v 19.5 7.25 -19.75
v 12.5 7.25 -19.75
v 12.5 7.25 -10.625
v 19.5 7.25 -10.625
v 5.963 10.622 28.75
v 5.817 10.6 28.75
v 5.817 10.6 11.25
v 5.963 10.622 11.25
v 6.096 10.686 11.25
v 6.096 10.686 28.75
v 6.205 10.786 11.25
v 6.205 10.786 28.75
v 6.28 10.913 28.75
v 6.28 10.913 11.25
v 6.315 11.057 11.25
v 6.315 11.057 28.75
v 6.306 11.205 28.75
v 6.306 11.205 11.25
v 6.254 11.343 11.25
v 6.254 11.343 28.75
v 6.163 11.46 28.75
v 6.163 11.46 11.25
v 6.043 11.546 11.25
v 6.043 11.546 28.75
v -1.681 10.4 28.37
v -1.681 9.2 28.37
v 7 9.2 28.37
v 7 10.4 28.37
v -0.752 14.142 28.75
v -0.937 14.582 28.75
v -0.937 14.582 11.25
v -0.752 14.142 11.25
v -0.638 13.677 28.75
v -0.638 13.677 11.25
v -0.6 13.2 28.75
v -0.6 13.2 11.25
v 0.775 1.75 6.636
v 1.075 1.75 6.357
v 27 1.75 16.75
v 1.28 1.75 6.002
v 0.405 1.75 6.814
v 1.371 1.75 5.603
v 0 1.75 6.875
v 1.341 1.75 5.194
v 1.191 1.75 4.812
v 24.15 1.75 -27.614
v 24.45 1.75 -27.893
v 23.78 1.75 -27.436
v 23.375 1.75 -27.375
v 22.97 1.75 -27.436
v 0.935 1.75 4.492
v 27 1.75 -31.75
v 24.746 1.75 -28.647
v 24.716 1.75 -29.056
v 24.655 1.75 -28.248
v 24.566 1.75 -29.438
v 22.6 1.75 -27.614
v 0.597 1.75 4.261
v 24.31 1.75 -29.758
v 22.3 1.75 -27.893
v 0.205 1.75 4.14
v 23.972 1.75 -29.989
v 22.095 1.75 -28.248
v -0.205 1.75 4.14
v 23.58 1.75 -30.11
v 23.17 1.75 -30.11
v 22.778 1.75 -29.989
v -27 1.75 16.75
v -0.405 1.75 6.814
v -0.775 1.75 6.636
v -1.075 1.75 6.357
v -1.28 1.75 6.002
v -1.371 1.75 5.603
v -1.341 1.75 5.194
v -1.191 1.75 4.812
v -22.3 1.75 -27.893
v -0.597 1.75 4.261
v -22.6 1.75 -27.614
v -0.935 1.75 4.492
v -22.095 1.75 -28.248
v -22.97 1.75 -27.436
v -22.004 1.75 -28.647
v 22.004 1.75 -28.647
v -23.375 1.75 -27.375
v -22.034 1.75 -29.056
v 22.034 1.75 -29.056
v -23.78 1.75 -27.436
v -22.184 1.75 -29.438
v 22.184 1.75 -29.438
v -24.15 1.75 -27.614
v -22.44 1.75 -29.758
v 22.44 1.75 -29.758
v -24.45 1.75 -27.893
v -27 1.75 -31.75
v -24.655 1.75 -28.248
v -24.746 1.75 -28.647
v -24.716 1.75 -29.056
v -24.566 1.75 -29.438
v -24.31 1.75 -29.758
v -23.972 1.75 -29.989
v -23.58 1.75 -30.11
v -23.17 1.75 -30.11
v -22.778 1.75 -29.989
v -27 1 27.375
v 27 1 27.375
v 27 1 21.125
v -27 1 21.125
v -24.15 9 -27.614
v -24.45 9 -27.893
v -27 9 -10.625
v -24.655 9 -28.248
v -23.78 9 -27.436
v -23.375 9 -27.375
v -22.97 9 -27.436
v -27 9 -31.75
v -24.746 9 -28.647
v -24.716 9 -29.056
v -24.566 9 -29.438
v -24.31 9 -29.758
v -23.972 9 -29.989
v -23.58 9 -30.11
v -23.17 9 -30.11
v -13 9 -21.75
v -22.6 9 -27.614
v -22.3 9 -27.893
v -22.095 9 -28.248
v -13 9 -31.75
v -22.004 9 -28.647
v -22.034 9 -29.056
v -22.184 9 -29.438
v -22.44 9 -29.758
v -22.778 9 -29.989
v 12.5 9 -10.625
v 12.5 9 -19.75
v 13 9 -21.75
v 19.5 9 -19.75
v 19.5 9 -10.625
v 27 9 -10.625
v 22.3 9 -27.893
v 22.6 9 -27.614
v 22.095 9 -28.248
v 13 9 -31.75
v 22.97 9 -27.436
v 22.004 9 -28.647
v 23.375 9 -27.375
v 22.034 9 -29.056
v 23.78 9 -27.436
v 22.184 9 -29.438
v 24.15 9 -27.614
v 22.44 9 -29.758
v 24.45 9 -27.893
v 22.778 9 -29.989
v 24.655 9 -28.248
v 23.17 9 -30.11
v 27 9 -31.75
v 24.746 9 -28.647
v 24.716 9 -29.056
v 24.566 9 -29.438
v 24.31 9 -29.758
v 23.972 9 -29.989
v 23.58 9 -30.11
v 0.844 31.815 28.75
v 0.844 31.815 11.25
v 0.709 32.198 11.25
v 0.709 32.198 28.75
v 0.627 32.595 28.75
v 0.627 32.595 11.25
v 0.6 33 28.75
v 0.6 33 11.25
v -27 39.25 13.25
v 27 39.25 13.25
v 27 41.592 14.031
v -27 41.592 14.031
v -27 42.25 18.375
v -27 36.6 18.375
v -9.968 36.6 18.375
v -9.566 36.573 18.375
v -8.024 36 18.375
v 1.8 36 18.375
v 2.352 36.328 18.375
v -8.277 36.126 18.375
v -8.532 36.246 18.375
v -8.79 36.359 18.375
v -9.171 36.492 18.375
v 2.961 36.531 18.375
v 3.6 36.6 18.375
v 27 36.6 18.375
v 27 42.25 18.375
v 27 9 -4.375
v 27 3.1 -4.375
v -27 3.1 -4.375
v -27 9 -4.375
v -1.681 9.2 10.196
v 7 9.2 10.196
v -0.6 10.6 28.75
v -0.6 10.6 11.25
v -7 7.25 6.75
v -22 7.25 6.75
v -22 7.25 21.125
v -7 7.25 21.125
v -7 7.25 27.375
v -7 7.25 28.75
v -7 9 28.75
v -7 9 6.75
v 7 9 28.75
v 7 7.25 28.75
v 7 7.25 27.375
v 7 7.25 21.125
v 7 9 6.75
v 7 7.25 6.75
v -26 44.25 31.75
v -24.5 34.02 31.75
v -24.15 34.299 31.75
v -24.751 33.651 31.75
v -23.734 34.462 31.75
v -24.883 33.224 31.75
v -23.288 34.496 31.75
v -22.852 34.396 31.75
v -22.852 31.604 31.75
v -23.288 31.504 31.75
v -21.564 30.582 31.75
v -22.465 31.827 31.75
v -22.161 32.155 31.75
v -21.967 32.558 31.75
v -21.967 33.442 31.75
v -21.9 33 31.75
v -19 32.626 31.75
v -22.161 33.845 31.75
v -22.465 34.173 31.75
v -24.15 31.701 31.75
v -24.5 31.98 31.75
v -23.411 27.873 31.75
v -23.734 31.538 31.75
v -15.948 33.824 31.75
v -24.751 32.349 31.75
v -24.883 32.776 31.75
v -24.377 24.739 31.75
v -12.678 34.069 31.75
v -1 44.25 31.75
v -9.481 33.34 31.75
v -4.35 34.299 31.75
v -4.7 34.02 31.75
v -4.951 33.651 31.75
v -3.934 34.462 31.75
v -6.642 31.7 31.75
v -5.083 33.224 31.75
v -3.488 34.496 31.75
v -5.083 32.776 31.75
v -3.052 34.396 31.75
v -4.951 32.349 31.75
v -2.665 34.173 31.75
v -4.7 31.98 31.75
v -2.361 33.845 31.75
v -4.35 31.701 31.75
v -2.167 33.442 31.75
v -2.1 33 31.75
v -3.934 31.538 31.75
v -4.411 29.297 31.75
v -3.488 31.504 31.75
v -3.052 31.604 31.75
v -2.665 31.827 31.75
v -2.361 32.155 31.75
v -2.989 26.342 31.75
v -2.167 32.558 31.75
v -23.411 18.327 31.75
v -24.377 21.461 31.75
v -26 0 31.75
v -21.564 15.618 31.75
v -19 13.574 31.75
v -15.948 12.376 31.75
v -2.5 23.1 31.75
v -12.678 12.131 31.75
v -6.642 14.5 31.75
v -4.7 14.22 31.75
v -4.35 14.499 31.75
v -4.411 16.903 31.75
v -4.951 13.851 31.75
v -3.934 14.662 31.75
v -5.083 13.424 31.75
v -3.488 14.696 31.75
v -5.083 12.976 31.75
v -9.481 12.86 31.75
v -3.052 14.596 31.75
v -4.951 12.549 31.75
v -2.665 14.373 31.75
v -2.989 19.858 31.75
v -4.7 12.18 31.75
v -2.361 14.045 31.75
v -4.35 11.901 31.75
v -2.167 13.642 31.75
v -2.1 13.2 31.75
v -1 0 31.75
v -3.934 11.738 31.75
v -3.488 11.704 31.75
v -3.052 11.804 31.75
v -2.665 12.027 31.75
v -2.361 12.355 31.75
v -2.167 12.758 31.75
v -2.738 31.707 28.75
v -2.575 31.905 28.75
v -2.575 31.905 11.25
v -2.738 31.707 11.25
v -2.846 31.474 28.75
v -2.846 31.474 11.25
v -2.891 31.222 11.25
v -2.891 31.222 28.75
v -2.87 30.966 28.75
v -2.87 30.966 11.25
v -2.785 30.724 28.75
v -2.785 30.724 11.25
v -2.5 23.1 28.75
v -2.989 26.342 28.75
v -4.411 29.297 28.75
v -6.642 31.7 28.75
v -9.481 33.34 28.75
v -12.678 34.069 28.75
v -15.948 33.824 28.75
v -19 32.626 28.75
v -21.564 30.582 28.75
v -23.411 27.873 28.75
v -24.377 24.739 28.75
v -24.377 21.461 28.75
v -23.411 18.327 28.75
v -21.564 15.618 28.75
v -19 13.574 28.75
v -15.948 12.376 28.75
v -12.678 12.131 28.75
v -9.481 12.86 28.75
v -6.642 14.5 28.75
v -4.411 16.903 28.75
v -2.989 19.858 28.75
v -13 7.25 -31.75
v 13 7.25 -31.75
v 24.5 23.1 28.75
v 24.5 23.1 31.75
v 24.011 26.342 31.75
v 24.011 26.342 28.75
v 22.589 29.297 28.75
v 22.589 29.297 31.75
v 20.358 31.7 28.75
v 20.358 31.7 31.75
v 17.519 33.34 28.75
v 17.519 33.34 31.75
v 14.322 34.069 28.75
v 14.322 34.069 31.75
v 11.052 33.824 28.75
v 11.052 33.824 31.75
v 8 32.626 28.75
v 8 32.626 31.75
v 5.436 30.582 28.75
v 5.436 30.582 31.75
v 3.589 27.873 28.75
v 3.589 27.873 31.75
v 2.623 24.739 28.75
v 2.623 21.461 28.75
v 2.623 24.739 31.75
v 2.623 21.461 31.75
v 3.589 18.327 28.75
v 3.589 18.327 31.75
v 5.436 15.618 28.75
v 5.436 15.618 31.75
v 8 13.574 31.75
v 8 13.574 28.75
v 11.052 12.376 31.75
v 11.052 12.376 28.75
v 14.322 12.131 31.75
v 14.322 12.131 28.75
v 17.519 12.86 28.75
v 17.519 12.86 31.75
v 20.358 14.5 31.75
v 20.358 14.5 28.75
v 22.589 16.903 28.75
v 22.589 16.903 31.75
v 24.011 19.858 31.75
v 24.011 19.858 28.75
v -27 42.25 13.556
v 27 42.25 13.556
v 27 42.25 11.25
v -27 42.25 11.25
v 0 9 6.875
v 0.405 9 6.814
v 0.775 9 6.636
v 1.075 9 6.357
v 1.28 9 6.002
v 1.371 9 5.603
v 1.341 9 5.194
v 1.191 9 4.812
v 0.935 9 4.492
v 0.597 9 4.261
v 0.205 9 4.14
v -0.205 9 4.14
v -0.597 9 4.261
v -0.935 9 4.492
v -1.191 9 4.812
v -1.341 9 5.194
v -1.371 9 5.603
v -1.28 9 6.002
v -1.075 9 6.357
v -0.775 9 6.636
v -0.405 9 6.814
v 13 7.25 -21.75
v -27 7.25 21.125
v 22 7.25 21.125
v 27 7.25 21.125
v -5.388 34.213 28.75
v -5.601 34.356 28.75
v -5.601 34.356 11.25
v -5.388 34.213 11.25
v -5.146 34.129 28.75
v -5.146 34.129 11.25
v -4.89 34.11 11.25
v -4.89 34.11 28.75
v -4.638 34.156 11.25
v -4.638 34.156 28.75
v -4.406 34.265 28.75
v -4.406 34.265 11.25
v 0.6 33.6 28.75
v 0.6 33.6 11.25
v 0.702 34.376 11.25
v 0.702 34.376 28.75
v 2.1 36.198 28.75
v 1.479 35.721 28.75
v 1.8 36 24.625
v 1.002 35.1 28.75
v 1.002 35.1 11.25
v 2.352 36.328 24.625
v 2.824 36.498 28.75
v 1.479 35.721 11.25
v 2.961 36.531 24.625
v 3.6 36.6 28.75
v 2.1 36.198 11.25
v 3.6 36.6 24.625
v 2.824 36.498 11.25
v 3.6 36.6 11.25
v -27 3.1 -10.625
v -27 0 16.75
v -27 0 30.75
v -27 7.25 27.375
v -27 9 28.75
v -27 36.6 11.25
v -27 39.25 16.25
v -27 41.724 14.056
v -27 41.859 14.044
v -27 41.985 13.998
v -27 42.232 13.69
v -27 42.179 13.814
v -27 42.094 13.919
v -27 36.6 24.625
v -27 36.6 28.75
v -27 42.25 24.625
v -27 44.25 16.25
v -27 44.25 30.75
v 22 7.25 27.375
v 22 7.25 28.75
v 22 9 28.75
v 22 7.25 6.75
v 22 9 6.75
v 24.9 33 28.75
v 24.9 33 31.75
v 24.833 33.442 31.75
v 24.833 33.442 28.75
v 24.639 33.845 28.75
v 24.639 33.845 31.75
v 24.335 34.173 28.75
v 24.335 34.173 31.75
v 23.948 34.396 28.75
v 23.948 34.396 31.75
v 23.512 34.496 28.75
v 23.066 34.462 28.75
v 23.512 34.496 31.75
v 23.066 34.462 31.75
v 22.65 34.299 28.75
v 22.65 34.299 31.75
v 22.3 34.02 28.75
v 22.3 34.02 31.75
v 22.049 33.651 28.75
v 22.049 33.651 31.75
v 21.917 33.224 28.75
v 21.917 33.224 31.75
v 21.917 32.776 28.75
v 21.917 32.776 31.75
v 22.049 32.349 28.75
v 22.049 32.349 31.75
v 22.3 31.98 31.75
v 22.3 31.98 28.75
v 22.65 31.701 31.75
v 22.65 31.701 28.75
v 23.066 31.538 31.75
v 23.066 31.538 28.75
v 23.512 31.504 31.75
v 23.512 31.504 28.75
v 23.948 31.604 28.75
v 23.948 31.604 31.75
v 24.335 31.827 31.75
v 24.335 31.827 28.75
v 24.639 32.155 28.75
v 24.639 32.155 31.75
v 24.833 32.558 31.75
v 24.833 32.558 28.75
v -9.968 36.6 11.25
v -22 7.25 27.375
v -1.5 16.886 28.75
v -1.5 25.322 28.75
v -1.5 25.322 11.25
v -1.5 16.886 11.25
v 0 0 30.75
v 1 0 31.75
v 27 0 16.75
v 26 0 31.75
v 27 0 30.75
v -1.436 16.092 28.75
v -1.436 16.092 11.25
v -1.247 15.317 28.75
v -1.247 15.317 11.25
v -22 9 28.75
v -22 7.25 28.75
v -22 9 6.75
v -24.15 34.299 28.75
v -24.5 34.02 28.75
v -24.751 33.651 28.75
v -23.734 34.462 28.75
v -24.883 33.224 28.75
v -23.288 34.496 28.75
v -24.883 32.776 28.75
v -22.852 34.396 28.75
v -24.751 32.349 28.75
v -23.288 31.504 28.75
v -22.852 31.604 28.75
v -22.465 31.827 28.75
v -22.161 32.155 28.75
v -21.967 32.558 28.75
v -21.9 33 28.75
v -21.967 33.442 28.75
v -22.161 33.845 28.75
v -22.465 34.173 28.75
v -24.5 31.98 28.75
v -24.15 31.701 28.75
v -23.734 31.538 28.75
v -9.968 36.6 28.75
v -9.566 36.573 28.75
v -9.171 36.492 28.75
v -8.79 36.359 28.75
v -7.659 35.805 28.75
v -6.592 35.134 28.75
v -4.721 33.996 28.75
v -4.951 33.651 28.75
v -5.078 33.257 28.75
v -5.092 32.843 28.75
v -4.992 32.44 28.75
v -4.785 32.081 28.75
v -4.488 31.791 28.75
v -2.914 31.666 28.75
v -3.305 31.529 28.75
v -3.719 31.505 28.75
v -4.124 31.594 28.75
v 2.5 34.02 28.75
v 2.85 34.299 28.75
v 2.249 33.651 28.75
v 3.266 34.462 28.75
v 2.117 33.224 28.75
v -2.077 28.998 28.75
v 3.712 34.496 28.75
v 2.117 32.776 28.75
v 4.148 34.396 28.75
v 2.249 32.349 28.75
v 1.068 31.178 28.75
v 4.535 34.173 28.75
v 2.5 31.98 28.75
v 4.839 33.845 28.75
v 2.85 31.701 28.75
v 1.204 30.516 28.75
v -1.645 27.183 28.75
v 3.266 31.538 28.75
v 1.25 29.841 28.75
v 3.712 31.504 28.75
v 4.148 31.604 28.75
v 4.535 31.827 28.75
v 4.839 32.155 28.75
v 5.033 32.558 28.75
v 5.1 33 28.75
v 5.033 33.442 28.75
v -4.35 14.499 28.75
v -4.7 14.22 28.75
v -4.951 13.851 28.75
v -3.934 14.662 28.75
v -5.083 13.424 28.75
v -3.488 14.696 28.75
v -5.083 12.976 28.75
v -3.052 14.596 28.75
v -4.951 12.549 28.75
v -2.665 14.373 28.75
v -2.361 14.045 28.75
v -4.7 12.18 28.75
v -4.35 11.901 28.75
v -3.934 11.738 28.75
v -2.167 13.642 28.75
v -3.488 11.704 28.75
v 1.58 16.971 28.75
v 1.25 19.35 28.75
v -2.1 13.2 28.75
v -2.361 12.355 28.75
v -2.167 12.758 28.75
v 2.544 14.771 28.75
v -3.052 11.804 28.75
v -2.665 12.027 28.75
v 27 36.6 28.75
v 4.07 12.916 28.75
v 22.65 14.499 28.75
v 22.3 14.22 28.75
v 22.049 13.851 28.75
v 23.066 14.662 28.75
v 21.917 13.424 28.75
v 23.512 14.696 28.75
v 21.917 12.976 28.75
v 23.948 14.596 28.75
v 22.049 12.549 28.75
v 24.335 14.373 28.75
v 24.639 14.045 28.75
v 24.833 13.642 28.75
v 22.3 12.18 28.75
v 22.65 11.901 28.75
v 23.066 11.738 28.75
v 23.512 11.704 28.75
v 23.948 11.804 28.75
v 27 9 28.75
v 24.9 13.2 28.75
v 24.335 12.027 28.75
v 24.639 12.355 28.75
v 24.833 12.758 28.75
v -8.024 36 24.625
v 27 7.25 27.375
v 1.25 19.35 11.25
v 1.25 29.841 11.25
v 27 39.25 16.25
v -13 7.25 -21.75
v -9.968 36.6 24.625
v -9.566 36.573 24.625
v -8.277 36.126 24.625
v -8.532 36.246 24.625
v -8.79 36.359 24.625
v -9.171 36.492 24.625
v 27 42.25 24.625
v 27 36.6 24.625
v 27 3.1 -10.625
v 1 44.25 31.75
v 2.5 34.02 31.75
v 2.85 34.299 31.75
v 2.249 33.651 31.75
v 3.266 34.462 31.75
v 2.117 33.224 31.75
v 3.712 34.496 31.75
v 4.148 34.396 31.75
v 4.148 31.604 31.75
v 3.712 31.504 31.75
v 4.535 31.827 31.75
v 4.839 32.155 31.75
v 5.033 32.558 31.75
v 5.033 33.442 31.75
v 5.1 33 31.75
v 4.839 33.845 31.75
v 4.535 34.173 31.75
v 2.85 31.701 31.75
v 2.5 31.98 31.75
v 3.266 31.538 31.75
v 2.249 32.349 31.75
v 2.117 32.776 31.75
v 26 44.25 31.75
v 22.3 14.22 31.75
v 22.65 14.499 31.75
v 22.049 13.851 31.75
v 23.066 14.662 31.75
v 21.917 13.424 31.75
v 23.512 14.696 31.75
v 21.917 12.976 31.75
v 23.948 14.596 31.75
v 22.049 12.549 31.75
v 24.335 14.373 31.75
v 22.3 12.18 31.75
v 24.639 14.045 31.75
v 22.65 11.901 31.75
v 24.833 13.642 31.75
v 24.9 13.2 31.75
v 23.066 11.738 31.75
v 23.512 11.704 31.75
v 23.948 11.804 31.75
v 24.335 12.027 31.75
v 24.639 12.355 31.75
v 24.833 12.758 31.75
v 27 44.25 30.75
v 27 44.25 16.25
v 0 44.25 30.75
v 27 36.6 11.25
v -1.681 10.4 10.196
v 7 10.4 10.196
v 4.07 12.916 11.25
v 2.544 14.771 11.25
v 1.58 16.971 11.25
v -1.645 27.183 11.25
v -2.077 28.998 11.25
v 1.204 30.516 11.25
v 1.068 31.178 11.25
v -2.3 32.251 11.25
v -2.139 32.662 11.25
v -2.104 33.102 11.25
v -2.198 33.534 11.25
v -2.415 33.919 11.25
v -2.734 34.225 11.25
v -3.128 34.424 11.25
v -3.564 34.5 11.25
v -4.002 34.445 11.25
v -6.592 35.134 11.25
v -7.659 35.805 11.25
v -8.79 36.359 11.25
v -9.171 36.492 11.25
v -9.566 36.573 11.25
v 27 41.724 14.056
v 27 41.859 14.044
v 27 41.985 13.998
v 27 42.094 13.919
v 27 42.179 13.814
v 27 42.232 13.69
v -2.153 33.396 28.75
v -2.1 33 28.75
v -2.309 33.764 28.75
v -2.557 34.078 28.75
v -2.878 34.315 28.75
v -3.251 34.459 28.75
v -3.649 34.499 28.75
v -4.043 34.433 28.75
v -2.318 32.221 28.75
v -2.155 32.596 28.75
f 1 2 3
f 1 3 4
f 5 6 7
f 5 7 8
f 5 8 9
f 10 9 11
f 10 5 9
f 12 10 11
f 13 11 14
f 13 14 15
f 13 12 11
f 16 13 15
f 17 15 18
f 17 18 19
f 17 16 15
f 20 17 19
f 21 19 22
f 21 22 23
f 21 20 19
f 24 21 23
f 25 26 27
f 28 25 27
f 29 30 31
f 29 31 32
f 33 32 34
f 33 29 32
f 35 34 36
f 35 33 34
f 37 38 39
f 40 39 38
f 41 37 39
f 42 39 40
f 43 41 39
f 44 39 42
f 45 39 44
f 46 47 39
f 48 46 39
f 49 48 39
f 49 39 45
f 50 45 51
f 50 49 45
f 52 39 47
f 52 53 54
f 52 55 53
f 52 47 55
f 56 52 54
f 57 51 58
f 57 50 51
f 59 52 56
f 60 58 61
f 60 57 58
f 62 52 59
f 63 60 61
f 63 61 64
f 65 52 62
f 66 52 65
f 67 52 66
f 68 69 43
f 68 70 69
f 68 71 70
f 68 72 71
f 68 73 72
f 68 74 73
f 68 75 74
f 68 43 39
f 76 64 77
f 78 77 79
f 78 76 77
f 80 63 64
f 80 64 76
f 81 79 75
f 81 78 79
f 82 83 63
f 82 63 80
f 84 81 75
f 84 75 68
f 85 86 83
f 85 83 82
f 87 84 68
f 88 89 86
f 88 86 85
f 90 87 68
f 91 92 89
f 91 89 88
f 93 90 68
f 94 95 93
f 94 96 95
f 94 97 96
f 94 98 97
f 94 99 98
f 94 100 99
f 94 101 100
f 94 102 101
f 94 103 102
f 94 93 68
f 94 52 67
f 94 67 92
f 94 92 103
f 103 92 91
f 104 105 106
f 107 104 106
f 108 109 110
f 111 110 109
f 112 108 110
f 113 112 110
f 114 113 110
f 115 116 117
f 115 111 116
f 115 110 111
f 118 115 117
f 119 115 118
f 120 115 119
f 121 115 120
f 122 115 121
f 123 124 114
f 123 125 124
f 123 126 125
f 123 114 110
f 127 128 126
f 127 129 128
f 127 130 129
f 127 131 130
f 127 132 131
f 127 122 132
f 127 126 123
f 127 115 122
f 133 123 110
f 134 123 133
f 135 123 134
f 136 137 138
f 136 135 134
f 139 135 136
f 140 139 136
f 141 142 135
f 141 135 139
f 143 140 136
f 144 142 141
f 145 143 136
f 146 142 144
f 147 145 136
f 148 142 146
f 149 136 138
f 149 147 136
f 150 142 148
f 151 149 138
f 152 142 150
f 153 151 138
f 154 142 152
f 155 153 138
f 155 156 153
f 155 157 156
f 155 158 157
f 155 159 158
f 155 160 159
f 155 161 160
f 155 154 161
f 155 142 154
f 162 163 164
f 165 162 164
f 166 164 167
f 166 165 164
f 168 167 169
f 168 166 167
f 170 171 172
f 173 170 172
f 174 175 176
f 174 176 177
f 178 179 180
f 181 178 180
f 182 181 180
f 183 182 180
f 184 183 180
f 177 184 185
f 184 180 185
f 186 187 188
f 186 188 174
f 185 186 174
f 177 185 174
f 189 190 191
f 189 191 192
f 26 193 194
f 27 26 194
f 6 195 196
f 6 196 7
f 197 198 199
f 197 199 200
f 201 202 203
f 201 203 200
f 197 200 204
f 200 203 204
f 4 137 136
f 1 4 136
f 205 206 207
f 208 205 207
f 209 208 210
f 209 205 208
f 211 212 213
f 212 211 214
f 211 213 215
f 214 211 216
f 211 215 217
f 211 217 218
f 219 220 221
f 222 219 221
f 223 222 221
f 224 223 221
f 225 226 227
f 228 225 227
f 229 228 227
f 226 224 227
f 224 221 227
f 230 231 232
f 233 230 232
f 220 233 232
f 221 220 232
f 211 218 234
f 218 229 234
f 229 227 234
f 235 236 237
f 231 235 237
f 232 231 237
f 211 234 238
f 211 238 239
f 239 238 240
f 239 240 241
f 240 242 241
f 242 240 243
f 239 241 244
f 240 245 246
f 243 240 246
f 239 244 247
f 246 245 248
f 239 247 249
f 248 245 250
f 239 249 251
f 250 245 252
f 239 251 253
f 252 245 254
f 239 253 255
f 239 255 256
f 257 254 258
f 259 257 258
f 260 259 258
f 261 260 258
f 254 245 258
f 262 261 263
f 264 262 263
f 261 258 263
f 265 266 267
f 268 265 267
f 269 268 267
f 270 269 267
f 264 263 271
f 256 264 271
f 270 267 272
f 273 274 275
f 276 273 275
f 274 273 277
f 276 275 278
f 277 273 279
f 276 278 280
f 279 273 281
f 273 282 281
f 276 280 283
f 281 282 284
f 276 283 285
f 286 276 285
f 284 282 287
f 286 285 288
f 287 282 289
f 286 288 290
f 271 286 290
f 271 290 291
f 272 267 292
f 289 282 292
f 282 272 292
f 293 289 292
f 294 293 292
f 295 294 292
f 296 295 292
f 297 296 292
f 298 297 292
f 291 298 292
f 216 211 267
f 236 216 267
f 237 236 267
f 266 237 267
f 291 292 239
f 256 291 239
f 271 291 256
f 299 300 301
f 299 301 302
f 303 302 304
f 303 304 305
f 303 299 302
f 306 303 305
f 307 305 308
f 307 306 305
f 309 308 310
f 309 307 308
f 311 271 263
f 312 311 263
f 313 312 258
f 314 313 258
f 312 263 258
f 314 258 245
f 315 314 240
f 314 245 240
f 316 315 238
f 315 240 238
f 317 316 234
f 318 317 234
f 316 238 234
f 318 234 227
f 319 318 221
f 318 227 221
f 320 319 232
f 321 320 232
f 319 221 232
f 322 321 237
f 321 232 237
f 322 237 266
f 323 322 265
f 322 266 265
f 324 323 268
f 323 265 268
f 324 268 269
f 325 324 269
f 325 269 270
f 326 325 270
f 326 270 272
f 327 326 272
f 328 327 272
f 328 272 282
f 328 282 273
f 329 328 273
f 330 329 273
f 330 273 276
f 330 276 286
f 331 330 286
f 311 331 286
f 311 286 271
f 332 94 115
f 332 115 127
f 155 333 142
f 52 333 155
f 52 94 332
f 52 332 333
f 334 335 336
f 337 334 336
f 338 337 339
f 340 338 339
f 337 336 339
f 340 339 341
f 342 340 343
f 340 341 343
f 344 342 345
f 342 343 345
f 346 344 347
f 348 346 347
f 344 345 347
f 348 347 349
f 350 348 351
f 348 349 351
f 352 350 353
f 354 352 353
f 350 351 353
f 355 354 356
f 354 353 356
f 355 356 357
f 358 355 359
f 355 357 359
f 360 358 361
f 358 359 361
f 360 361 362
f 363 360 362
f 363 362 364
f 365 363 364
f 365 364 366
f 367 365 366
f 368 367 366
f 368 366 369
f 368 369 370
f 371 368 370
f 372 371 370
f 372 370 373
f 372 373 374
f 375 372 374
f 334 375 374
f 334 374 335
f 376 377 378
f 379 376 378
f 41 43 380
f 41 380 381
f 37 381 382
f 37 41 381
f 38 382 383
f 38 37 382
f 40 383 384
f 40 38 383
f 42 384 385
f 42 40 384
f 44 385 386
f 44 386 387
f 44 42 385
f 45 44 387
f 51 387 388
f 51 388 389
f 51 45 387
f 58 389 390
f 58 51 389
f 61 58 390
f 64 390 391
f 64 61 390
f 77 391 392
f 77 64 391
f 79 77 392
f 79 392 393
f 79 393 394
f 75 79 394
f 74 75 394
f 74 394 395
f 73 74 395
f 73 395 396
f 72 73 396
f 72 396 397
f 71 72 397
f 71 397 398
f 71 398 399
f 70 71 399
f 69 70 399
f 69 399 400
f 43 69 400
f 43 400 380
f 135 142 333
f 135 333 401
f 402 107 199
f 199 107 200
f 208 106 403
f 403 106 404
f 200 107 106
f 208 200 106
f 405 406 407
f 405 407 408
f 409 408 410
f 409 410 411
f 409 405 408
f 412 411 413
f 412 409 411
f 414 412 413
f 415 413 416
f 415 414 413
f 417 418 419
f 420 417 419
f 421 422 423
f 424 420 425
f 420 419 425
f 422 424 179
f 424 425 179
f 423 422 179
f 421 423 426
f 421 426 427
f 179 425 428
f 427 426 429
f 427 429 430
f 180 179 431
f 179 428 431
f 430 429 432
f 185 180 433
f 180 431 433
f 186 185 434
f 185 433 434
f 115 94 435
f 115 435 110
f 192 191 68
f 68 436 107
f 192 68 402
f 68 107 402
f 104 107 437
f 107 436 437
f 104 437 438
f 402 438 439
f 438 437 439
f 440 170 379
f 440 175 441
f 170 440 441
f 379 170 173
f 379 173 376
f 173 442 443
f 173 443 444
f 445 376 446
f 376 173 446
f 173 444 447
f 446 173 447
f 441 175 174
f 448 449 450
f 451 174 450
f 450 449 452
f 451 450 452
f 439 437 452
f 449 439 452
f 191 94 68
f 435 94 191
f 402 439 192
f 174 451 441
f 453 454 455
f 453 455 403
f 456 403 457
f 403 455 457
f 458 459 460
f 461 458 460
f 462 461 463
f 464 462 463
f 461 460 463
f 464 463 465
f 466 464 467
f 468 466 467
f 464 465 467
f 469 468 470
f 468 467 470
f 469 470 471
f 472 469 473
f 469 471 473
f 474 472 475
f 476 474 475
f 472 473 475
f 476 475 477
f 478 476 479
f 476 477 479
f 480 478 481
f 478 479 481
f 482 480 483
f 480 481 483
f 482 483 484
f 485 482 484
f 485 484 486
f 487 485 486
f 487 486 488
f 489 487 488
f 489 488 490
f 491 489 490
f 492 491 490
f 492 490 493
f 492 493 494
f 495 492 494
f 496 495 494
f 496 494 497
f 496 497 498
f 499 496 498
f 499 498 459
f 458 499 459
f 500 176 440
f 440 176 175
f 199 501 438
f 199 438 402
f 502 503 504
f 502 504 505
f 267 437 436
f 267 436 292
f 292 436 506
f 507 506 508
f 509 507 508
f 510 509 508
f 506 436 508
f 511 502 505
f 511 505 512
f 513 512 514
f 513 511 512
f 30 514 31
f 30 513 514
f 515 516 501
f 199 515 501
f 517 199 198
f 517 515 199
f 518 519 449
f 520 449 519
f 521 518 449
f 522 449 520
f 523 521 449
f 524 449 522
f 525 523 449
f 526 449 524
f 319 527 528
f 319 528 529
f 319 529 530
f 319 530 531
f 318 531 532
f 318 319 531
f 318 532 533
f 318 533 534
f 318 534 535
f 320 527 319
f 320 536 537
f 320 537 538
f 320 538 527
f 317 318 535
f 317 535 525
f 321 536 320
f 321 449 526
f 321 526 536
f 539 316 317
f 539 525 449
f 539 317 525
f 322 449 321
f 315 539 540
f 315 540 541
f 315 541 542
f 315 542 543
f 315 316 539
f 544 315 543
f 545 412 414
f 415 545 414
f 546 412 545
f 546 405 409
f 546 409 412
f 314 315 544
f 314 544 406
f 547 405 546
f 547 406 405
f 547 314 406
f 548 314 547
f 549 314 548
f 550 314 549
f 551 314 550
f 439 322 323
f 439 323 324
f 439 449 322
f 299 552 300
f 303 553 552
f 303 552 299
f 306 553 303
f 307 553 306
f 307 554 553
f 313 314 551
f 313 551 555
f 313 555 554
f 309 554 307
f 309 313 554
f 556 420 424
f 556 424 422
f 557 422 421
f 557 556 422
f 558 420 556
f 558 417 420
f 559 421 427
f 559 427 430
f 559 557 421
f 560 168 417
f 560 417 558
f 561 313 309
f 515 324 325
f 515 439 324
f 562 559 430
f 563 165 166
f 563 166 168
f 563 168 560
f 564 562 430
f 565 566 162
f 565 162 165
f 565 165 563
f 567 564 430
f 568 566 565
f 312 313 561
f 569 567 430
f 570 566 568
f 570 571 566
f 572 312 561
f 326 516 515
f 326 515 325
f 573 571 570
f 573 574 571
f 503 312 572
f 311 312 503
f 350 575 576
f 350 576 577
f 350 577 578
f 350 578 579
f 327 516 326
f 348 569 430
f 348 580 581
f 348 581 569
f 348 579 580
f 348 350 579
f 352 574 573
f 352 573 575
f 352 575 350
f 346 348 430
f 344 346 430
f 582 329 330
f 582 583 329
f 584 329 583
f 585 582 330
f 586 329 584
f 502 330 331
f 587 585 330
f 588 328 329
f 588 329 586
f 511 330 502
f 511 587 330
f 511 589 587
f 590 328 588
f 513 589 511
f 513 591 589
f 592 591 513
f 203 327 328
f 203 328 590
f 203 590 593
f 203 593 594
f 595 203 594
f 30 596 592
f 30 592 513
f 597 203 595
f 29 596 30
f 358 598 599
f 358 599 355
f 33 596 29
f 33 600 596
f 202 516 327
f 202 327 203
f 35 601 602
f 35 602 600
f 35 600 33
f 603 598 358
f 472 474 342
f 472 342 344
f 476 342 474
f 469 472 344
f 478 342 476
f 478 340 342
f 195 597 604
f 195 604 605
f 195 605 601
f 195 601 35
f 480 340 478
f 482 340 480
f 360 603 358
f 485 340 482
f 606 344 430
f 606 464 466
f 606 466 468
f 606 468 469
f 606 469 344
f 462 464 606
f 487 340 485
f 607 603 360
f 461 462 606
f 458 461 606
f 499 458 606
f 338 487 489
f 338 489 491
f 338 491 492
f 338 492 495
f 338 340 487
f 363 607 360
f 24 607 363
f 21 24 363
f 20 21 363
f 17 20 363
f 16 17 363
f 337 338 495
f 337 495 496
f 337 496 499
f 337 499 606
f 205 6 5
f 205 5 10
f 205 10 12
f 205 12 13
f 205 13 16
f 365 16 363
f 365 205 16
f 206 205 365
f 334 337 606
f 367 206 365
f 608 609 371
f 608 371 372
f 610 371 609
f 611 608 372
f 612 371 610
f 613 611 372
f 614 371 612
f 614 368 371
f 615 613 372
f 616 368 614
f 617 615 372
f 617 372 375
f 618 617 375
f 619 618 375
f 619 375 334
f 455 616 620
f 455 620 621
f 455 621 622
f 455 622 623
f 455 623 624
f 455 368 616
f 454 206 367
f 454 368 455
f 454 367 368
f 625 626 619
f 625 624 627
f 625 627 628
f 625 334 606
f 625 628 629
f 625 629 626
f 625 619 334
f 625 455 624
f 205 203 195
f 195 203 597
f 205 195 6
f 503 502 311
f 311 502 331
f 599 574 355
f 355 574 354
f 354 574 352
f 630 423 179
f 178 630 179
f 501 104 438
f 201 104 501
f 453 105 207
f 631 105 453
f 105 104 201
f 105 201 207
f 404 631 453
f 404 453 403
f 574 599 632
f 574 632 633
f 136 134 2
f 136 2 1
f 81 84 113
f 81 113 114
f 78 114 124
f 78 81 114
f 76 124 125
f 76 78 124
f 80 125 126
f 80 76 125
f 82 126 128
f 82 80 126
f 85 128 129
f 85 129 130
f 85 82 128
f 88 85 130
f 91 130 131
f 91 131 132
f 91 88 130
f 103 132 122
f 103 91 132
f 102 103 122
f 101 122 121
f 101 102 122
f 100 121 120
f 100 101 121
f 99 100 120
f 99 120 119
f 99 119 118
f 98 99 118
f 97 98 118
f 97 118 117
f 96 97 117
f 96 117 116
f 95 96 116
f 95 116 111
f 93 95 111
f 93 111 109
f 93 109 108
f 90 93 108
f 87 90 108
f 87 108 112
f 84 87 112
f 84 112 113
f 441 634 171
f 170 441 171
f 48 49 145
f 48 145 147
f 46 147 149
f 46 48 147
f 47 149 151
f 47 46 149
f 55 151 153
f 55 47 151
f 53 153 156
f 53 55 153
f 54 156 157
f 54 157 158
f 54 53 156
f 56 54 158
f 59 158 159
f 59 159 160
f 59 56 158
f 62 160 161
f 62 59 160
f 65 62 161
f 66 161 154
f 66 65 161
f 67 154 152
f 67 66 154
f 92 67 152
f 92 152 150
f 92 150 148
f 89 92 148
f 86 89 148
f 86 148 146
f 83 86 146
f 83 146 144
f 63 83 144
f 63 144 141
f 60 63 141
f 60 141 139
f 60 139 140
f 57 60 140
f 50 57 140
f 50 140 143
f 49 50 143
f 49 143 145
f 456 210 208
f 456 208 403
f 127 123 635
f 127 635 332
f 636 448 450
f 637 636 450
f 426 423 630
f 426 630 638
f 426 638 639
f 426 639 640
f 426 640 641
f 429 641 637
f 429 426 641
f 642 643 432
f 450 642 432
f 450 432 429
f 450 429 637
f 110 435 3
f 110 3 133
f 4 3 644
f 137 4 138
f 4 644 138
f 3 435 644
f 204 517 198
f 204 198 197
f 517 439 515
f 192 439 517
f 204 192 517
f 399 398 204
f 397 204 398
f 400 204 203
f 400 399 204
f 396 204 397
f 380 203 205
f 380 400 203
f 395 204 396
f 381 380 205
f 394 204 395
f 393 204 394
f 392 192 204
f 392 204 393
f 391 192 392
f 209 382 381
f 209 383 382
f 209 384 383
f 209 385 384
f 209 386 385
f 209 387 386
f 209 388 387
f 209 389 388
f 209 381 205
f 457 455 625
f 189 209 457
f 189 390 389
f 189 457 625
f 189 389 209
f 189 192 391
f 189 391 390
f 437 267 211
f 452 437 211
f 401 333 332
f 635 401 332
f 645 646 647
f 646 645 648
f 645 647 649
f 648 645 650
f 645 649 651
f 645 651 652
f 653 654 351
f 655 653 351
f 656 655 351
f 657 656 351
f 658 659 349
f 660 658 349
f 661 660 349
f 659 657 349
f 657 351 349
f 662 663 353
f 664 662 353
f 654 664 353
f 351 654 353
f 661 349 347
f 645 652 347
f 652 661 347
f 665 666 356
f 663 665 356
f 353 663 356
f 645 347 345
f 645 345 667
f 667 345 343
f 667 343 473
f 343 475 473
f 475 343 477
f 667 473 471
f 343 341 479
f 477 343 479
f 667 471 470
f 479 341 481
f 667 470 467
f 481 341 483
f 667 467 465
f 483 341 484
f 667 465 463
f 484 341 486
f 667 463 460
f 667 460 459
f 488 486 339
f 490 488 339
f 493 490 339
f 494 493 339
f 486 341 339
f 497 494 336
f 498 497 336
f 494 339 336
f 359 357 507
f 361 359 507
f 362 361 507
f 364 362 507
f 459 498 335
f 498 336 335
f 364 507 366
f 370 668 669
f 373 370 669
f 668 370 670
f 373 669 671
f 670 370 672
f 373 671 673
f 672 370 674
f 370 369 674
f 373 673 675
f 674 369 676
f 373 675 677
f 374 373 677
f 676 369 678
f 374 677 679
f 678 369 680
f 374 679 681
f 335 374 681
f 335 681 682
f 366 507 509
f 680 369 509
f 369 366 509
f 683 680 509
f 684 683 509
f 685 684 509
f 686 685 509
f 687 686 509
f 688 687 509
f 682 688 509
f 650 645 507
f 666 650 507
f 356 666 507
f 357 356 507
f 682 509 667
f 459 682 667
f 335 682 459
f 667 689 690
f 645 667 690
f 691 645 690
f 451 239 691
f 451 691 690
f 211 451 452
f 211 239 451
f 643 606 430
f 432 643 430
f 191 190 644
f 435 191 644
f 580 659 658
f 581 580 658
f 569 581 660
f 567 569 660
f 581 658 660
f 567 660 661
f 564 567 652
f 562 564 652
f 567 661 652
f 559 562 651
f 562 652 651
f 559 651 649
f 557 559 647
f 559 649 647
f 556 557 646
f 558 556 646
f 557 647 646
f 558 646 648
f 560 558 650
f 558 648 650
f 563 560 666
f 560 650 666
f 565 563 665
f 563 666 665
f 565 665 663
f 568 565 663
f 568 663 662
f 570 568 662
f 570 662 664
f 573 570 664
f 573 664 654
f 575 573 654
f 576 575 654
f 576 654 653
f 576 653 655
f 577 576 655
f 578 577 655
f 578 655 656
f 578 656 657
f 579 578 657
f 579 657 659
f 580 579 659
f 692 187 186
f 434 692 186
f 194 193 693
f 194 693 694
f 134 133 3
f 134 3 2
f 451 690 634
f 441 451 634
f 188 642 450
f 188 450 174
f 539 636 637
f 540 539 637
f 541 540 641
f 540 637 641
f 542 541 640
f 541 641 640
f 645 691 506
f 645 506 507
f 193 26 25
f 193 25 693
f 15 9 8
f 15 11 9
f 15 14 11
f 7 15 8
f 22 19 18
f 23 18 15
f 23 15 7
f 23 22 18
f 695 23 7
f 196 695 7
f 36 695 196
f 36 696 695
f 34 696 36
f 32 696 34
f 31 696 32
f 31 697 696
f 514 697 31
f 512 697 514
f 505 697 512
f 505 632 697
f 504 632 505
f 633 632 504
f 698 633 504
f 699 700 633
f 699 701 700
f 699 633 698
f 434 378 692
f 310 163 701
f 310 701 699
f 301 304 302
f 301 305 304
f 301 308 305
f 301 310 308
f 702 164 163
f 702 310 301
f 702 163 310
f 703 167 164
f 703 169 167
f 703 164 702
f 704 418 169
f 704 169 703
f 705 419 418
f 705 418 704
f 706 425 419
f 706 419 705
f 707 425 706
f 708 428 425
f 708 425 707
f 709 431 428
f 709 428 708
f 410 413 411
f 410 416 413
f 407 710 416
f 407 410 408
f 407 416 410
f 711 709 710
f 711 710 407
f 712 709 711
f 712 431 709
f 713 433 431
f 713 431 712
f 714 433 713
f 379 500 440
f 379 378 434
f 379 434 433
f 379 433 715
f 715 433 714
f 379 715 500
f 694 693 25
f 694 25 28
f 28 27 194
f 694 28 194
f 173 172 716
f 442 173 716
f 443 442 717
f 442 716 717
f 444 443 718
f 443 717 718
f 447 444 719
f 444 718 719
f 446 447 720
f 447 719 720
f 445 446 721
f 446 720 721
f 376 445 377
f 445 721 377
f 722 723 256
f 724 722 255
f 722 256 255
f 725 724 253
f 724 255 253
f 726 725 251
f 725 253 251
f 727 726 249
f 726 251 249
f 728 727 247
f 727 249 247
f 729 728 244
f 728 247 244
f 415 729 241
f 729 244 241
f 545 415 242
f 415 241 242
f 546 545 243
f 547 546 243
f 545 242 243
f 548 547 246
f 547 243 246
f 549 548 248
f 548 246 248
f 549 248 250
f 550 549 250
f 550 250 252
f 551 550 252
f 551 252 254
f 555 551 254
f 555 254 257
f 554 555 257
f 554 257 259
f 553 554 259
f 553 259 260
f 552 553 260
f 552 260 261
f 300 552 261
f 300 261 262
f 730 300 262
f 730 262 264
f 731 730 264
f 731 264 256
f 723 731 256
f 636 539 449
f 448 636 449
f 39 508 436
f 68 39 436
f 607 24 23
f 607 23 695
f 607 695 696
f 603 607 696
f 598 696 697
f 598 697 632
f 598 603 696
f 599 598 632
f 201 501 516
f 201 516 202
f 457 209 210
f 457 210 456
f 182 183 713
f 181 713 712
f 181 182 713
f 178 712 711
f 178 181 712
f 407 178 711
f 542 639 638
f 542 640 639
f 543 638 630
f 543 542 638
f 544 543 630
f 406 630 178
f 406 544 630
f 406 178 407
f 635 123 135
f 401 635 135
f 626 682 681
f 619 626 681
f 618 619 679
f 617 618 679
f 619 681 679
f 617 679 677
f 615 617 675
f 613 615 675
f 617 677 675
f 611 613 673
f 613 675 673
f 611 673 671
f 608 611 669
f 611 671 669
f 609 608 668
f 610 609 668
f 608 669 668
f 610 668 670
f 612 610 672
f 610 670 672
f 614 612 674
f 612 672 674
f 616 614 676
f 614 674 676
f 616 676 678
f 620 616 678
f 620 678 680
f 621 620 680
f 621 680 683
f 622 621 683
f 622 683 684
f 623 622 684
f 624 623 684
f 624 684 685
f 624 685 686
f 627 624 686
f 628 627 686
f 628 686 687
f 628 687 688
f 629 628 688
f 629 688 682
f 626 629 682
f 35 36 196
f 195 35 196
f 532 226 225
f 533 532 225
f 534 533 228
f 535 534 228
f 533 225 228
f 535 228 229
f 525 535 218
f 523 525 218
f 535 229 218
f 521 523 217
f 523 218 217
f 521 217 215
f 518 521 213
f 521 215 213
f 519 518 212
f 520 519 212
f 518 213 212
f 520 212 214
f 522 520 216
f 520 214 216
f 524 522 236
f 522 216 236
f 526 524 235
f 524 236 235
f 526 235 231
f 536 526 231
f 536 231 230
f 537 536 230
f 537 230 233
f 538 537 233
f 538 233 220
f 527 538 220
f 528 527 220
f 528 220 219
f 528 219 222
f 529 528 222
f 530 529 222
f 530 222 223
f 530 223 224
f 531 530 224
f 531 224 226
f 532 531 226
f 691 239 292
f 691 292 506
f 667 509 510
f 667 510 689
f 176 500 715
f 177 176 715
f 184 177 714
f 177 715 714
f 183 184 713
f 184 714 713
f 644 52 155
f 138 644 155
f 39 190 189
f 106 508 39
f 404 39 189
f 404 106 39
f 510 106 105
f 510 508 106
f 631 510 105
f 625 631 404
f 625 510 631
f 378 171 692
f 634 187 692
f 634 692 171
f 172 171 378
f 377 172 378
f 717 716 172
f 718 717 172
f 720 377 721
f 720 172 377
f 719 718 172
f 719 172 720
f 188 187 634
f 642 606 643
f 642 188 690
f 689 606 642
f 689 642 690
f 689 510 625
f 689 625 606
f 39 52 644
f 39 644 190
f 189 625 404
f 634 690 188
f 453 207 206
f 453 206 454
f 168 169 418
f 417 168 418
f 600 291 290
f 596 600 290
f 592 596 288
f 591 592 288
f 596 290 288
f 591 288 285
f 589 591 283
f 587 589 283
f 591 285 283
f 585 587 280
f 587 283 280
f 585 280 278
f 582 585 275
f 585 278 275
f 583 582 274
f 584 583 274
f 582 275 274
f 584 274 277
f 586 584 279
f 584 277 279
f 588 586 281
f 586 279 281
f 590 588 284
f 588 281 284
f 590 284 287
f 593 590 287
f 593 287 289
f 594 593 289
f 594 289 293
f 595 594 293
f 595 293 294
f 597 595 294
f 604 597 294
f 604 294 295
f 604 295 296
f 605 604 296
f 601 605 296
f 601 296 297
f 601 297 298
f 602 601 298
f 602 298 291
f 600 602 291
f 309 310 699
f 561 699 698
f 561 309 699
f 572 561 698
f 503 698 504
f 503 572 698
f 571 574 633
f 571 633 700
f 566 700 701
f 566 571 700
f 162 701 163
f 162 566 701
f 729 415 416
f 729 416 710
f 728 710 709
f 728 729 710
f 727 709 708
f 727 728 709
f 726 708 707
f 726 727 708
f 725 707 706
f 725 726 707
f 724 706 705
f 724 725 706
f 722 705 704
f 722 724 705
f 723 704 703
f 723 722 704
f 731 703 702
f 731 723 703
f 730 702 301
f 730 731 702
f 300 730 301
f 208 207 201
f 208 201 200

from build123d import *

# Parameters (mm, degrees)
SKETCH1_W           = 54
SKETCH1_H           = 63.5
SKETCH1_R           = 1.375
BOSS_EXTRUDE1_DEPTH = 9
SKETCH2_W           = 54
SKETCH2_H           = 3
BOSS_EXTRUDE2_DEPTH = 35.25
SKETCH3_R           = 11
SKETCH3_R_2         = 1.5
CUT_EXTRUDE1_DEPTH  = 82.9714127
SKETCH4_W           = 54
SKETCH4_H           = 48.5
CUT_EXTRUDE2_DEPTH  = 1.75
BOSS_EXTRUDE3_DEPTH = 17.5
SKETCH6_W           = 54
SKETCH6_H           = 7.65
BOSS_EXTRUDE5_DEPTH = 17.5
FILLET2_R           = 3
SKETCH8_W           = 15
SKETCH8_H           = 22
SKETCH8_W_2         = 7
SKETCH8_H_2         = 10
CUT_EXTRUDE4_DEPTH  = 1.75
SKETCH7_W           = 6.25
SKETCH7_H           = 6.25
SKETCH7_H_2         = 5.9
CUT_EXTRUDE3_DEPTH  = 77.695012876
CHAMFER2_SIZE       = 1
CUT_EXTRUDE5_DEPTH  = 61.787539842
CUT_EXTRUDE6_DEPTH  = 77.695012876
BOSS_EXTRUDE6_START = 0.2
SKETCH13_W          = 8.680886663
SKETCH13_H          = 18.174047098
BOSS_EXTRUDE6_DEPTH = 1.2


with BuildPart() as part:
    # Sketch1 → Boss-Extrude1 (new body)
    with BuildSketch(Plane(origin=(0, 0, 0), x_dir=(1, 0, 0), z_dir=(0, 1, 0))):
        Rectangle(SKETCH1_W, SKETCH1_H)
        with Locations(Location((-23.375, 28.75, 0), (0, 0, 270))):
            Circle(SKETCH1_R, mode=Mode.SUBTRACT)
        with Locations(Location((23.375, 28.75, 0), (0, 0, 270))):
            Circle(SKETCH1_R, mode=Mode.SUBTRACT)
        with Locations(Location((0, -5.5, 0), (0, 0, 270))):
            Circle(SKETCH1_R, mode=Mode.SUBTRACT)
    extrude(amount=BOSS_EXTRUDE1_DEPTH)

    # Sketch2 → Boss-Extrude2 (add)
    with BuildSketch(Plane(origin=(0, 9, 0), x_dir=(1, 0, 0), z_dir=(0, 1, 0))):
        with Locations((0, -30.25)):
            Rectangle(SKETCH2_W, SKETCH2_H)
    extrude(amount=BOSS_EXTRUDE2_DEPTH)

    # Sketch3 → Cut-Extrude1 (cut, through all)
    with BuildSketch(Plane.XY.offset(31.75)):
        with Locations((-13.5, 23.1)):
            Circle(SKETCH3_R)
        with Locations((13.5, 23.1)):
            Circle(SKETCH3_R)
        with Locations((-23.4, 33)):
            Circle(SKETCH3_R_2)
        with Locations((-3.6, 13.2)):
            Circle(SKETCH3_R_2)
        with Locations((3.6, 33)):
            Circle(SKETCH3_R_2)
        with Locations((23.4, 13.2)):
            Circle(SKETCH3_R_2)
        with Locations((-3.6, 33)):
            Circle(SKETCH3_R_2)
        with Locations((23.4, 33)):
            Circle(SKETCH3_R_2)
    extrude(amount=-CUT_EXTRUDE1_DEPTH, mode=Mode.SUBTRACT)

    # Sketch4 → Cut-Extrude2 (cut)
    with BuildSketch(Plane(origin=(0, 0, 0), x_dir=(-1, 0, 0), z_dir=(0, -1, 0))):
        with Locations((0, 7.5)):
            Rectangle(SKETCH4_W, SKETCH4_H)
    extrude(amount=-CUT_EXTRUDE2_DEPTH, mode=Mode.SUBTRACT)

    # Sketch5 → Boss-Extrude3 (add)
    with BuildSketch(Plane(origin=(0, 0, 28.75), x_dir=(-1, 0, 0), z_dir=(0, 0, -1))):
        with BuildLine():
            Line((-1.25, 23.1), (-1.25, 29.841281906))
            ThreePointArc((-1.25, 29.841281906), (-1.147384506, 30.849064124), (-0.84375, 31.815480715))
            ThreePointArc((-0.84375, 31.815480715), (-0.661569296, 32.395330669), (-0.6, 33))
            Line((-0.6, 33), (-0.6, 36.6))
            Line((-0.6, 36.6), (9.4, 36.6))
            ThreePointArc((9.4, 36.6), (7.396552209, 35.65403434), (5.601157986, 34.355876542))
            ThreePointArc((5.601157986, 34.355876542), (5.018547742, 34.111551246), (4.405752691, 34.265212473))
            ThreePointArc((4.405752691, 34.265212473), (2.414687889, 33.919257961), (2.575108687, 31.90473848))
            ThreePointArc((2.575108687, 31.90473848), (2.876434451, 31.349461675), (2.784782595, 30.724378093))
            ThreePointArc((2.784782595, 30.724378093), (1.825613317, 28.09859937), (1.5, 25.322145594))
            Line((1.5, 25.322145594), (1.5, 23.1))
            Line((1.5, 23.1), (1.5, 16.886461718))
            ThreePointArc((1.5, 16.886461718), (1.357339807, 15.700607596), (0.9375, 14.582423144))
            ThreePointArc((0.9375, 14.582423144), (0.685596116, 13.911512474), (0.6, 13.2))
            Line((0.6, 13.2), (0.6, 10.6))
            Line((0.6, 10.6), (0, 10.6))
            Line((0, 10.6), (-5.816699867, 10.6))
            ThreePointArc((-5.816699867, 10.6), (-6.30299863, 10.983752361), (-6.042824199, 11.545945946))
            ThreePointArc((-6.042824199, 11.545945946), (-2.543868689, 14.770850967), (-1.25, 19.35))
            Line((-1.25, 19.35), (-1.25, 23.1))
        make_face()
    extrude(amount=BOSS_EXTRUDE3_DEPTH)

    # Sketch6 → Boss-Extrude5 (add)
    with BuildSketch(Plane(origin=(0, 0, 28.75), x_dir=(-1, 0, 0), z_dir=(0, 0, -1))):
        with Locations((0, 40.425)):
            Rectangle(SKETCH6_W, SKETCH6_H)
    extrude(amount=BOSS_EXTRUDE5_DEPTH)

    # Fillet2
    fillet2_edges = [part.edges().sort_by_distance(p)[0] for p in [
        (-9.4, 36.6, 20),
        (0.6, 36.6, 20),
    ]]
    fillet(fillet2_edges, radius=FILLET2_R)

    # Sketch8 → Cut-Extrude4 (cut)
    with BuildSketch(Plane(origin=(0, 9, 0), x_dir=(1, 0, 0), z_dir=(0, 1, 0))):
        with Locations((14.5, -17.75)):
            Rectangle(SKETCH8_W, SKETCH8_H)
        with Locations((-14.5, -17.75)):
            Rectangle(SKETCH8_W, SKETCH8_H)
        Polygon((-13, 31.75), (13, 31.75), (13, 21.75), (0, 21.75), (-13, 21.75), align=None)
        with Locations((16, 14.75)):
            Rectangle(SKETCH8_W_2, SKETCH8_H_2)
    extrude(amount=-CUT_EXTRUDE4_DEPTH, mode=Mode.SUBTRACT)

    # Sketch7 → Cut-Extrude3 (cut, through all)
    with BuildSketch(Plane(origin=(27, 0, 0), x_dir=(0, 0, -1), z_dir=(1, 0, 0))):
        with Locations((-24.25, 4.125)):
            Rectangle(SKETCH7_W, SKETCH7_H)
        with Locations((-21.5, 39.125)):
            Rectangle(SKETCH7_W, SKETCH7_H)
        with Locations((7.5, 6.05)):
            Rectangle(SKETCH7_W, SKETCH7_H_2)
    extrude(amount=-CUT_EXTRUDE3_DEPTH, mode=Mode.SUBTRACT)

    # Chamfer2
    chamfer2_edges = [part.edges().sort_by_distance(p)[0] for p in [
        (27, 22.125, 31.75),
        (-27, 22.125, 31.75),
    ]]
    chamfer(chamfer2_edges, length=CHAMFER2_SIZE)

    # Sketch9 → Cut-Extrude5 (cut, through all)
    with BuildSketch(Plane(origin=(0, 44.25, 0), x_dir=(1, 0, 0), z_dir=(0, 1, 0))):
        Polygon((-1, -31.75), (0, -30.75), (1, -31.75), align=None)
    extrude(amount=-CUT_EXTRUDE5_DEPTH, mode=Mode.SUBTRACT)

    # Sketch10 → Cut-Extrude6 (cut, through all)
    with BuildSketch(Plane(origin=(27, 0, 0), x_dir=(0, 0, -1), z_dir=(1, 0, 0))):
        with BuildLine():
            Line((-11.25, 44.25), (-16.25, 44.25))
            Line((-16.25, 44.25), (-16.25, 39.25))
            Line((-16.25, 39.25), (-13.25, 39.25))
            Line((-13.25, 39.25), (-14.030628706, 41.591886117))
            ThreePointArc((-14.030628706, 41.591886117), (-13.961908149, 42.042355142), (-13.556287057, 42.25))
            Line((-13.556287057, 42.25), (-11.25, 42.25))
            Line((-11.25, 42.25), (-11.25, 44.25))
        make_face()
    extrude(amount=-CUT_EXTRUDE6_DEPTH, mode=Mode.SUBTRACT)


with BuildPart() as body_2:
    # Sketch13 → Boss-Extrude6 (new body)
    with BuildSketch(Plane(origin=(0, 9, 0), x_dir=(1, 0, 0), z_dir=(0, 1, 0)).offset(BOSS_EXTRUDE6_START)):
        with Locations((2.659556669, -19.282754062)):
            Rectangle(SKETCH13_W, SKETCH13_H)
    extrude(amount=BOSS_EXTRUDE6_DEPTH)


solid = Compound([part.part, body_2.part])
